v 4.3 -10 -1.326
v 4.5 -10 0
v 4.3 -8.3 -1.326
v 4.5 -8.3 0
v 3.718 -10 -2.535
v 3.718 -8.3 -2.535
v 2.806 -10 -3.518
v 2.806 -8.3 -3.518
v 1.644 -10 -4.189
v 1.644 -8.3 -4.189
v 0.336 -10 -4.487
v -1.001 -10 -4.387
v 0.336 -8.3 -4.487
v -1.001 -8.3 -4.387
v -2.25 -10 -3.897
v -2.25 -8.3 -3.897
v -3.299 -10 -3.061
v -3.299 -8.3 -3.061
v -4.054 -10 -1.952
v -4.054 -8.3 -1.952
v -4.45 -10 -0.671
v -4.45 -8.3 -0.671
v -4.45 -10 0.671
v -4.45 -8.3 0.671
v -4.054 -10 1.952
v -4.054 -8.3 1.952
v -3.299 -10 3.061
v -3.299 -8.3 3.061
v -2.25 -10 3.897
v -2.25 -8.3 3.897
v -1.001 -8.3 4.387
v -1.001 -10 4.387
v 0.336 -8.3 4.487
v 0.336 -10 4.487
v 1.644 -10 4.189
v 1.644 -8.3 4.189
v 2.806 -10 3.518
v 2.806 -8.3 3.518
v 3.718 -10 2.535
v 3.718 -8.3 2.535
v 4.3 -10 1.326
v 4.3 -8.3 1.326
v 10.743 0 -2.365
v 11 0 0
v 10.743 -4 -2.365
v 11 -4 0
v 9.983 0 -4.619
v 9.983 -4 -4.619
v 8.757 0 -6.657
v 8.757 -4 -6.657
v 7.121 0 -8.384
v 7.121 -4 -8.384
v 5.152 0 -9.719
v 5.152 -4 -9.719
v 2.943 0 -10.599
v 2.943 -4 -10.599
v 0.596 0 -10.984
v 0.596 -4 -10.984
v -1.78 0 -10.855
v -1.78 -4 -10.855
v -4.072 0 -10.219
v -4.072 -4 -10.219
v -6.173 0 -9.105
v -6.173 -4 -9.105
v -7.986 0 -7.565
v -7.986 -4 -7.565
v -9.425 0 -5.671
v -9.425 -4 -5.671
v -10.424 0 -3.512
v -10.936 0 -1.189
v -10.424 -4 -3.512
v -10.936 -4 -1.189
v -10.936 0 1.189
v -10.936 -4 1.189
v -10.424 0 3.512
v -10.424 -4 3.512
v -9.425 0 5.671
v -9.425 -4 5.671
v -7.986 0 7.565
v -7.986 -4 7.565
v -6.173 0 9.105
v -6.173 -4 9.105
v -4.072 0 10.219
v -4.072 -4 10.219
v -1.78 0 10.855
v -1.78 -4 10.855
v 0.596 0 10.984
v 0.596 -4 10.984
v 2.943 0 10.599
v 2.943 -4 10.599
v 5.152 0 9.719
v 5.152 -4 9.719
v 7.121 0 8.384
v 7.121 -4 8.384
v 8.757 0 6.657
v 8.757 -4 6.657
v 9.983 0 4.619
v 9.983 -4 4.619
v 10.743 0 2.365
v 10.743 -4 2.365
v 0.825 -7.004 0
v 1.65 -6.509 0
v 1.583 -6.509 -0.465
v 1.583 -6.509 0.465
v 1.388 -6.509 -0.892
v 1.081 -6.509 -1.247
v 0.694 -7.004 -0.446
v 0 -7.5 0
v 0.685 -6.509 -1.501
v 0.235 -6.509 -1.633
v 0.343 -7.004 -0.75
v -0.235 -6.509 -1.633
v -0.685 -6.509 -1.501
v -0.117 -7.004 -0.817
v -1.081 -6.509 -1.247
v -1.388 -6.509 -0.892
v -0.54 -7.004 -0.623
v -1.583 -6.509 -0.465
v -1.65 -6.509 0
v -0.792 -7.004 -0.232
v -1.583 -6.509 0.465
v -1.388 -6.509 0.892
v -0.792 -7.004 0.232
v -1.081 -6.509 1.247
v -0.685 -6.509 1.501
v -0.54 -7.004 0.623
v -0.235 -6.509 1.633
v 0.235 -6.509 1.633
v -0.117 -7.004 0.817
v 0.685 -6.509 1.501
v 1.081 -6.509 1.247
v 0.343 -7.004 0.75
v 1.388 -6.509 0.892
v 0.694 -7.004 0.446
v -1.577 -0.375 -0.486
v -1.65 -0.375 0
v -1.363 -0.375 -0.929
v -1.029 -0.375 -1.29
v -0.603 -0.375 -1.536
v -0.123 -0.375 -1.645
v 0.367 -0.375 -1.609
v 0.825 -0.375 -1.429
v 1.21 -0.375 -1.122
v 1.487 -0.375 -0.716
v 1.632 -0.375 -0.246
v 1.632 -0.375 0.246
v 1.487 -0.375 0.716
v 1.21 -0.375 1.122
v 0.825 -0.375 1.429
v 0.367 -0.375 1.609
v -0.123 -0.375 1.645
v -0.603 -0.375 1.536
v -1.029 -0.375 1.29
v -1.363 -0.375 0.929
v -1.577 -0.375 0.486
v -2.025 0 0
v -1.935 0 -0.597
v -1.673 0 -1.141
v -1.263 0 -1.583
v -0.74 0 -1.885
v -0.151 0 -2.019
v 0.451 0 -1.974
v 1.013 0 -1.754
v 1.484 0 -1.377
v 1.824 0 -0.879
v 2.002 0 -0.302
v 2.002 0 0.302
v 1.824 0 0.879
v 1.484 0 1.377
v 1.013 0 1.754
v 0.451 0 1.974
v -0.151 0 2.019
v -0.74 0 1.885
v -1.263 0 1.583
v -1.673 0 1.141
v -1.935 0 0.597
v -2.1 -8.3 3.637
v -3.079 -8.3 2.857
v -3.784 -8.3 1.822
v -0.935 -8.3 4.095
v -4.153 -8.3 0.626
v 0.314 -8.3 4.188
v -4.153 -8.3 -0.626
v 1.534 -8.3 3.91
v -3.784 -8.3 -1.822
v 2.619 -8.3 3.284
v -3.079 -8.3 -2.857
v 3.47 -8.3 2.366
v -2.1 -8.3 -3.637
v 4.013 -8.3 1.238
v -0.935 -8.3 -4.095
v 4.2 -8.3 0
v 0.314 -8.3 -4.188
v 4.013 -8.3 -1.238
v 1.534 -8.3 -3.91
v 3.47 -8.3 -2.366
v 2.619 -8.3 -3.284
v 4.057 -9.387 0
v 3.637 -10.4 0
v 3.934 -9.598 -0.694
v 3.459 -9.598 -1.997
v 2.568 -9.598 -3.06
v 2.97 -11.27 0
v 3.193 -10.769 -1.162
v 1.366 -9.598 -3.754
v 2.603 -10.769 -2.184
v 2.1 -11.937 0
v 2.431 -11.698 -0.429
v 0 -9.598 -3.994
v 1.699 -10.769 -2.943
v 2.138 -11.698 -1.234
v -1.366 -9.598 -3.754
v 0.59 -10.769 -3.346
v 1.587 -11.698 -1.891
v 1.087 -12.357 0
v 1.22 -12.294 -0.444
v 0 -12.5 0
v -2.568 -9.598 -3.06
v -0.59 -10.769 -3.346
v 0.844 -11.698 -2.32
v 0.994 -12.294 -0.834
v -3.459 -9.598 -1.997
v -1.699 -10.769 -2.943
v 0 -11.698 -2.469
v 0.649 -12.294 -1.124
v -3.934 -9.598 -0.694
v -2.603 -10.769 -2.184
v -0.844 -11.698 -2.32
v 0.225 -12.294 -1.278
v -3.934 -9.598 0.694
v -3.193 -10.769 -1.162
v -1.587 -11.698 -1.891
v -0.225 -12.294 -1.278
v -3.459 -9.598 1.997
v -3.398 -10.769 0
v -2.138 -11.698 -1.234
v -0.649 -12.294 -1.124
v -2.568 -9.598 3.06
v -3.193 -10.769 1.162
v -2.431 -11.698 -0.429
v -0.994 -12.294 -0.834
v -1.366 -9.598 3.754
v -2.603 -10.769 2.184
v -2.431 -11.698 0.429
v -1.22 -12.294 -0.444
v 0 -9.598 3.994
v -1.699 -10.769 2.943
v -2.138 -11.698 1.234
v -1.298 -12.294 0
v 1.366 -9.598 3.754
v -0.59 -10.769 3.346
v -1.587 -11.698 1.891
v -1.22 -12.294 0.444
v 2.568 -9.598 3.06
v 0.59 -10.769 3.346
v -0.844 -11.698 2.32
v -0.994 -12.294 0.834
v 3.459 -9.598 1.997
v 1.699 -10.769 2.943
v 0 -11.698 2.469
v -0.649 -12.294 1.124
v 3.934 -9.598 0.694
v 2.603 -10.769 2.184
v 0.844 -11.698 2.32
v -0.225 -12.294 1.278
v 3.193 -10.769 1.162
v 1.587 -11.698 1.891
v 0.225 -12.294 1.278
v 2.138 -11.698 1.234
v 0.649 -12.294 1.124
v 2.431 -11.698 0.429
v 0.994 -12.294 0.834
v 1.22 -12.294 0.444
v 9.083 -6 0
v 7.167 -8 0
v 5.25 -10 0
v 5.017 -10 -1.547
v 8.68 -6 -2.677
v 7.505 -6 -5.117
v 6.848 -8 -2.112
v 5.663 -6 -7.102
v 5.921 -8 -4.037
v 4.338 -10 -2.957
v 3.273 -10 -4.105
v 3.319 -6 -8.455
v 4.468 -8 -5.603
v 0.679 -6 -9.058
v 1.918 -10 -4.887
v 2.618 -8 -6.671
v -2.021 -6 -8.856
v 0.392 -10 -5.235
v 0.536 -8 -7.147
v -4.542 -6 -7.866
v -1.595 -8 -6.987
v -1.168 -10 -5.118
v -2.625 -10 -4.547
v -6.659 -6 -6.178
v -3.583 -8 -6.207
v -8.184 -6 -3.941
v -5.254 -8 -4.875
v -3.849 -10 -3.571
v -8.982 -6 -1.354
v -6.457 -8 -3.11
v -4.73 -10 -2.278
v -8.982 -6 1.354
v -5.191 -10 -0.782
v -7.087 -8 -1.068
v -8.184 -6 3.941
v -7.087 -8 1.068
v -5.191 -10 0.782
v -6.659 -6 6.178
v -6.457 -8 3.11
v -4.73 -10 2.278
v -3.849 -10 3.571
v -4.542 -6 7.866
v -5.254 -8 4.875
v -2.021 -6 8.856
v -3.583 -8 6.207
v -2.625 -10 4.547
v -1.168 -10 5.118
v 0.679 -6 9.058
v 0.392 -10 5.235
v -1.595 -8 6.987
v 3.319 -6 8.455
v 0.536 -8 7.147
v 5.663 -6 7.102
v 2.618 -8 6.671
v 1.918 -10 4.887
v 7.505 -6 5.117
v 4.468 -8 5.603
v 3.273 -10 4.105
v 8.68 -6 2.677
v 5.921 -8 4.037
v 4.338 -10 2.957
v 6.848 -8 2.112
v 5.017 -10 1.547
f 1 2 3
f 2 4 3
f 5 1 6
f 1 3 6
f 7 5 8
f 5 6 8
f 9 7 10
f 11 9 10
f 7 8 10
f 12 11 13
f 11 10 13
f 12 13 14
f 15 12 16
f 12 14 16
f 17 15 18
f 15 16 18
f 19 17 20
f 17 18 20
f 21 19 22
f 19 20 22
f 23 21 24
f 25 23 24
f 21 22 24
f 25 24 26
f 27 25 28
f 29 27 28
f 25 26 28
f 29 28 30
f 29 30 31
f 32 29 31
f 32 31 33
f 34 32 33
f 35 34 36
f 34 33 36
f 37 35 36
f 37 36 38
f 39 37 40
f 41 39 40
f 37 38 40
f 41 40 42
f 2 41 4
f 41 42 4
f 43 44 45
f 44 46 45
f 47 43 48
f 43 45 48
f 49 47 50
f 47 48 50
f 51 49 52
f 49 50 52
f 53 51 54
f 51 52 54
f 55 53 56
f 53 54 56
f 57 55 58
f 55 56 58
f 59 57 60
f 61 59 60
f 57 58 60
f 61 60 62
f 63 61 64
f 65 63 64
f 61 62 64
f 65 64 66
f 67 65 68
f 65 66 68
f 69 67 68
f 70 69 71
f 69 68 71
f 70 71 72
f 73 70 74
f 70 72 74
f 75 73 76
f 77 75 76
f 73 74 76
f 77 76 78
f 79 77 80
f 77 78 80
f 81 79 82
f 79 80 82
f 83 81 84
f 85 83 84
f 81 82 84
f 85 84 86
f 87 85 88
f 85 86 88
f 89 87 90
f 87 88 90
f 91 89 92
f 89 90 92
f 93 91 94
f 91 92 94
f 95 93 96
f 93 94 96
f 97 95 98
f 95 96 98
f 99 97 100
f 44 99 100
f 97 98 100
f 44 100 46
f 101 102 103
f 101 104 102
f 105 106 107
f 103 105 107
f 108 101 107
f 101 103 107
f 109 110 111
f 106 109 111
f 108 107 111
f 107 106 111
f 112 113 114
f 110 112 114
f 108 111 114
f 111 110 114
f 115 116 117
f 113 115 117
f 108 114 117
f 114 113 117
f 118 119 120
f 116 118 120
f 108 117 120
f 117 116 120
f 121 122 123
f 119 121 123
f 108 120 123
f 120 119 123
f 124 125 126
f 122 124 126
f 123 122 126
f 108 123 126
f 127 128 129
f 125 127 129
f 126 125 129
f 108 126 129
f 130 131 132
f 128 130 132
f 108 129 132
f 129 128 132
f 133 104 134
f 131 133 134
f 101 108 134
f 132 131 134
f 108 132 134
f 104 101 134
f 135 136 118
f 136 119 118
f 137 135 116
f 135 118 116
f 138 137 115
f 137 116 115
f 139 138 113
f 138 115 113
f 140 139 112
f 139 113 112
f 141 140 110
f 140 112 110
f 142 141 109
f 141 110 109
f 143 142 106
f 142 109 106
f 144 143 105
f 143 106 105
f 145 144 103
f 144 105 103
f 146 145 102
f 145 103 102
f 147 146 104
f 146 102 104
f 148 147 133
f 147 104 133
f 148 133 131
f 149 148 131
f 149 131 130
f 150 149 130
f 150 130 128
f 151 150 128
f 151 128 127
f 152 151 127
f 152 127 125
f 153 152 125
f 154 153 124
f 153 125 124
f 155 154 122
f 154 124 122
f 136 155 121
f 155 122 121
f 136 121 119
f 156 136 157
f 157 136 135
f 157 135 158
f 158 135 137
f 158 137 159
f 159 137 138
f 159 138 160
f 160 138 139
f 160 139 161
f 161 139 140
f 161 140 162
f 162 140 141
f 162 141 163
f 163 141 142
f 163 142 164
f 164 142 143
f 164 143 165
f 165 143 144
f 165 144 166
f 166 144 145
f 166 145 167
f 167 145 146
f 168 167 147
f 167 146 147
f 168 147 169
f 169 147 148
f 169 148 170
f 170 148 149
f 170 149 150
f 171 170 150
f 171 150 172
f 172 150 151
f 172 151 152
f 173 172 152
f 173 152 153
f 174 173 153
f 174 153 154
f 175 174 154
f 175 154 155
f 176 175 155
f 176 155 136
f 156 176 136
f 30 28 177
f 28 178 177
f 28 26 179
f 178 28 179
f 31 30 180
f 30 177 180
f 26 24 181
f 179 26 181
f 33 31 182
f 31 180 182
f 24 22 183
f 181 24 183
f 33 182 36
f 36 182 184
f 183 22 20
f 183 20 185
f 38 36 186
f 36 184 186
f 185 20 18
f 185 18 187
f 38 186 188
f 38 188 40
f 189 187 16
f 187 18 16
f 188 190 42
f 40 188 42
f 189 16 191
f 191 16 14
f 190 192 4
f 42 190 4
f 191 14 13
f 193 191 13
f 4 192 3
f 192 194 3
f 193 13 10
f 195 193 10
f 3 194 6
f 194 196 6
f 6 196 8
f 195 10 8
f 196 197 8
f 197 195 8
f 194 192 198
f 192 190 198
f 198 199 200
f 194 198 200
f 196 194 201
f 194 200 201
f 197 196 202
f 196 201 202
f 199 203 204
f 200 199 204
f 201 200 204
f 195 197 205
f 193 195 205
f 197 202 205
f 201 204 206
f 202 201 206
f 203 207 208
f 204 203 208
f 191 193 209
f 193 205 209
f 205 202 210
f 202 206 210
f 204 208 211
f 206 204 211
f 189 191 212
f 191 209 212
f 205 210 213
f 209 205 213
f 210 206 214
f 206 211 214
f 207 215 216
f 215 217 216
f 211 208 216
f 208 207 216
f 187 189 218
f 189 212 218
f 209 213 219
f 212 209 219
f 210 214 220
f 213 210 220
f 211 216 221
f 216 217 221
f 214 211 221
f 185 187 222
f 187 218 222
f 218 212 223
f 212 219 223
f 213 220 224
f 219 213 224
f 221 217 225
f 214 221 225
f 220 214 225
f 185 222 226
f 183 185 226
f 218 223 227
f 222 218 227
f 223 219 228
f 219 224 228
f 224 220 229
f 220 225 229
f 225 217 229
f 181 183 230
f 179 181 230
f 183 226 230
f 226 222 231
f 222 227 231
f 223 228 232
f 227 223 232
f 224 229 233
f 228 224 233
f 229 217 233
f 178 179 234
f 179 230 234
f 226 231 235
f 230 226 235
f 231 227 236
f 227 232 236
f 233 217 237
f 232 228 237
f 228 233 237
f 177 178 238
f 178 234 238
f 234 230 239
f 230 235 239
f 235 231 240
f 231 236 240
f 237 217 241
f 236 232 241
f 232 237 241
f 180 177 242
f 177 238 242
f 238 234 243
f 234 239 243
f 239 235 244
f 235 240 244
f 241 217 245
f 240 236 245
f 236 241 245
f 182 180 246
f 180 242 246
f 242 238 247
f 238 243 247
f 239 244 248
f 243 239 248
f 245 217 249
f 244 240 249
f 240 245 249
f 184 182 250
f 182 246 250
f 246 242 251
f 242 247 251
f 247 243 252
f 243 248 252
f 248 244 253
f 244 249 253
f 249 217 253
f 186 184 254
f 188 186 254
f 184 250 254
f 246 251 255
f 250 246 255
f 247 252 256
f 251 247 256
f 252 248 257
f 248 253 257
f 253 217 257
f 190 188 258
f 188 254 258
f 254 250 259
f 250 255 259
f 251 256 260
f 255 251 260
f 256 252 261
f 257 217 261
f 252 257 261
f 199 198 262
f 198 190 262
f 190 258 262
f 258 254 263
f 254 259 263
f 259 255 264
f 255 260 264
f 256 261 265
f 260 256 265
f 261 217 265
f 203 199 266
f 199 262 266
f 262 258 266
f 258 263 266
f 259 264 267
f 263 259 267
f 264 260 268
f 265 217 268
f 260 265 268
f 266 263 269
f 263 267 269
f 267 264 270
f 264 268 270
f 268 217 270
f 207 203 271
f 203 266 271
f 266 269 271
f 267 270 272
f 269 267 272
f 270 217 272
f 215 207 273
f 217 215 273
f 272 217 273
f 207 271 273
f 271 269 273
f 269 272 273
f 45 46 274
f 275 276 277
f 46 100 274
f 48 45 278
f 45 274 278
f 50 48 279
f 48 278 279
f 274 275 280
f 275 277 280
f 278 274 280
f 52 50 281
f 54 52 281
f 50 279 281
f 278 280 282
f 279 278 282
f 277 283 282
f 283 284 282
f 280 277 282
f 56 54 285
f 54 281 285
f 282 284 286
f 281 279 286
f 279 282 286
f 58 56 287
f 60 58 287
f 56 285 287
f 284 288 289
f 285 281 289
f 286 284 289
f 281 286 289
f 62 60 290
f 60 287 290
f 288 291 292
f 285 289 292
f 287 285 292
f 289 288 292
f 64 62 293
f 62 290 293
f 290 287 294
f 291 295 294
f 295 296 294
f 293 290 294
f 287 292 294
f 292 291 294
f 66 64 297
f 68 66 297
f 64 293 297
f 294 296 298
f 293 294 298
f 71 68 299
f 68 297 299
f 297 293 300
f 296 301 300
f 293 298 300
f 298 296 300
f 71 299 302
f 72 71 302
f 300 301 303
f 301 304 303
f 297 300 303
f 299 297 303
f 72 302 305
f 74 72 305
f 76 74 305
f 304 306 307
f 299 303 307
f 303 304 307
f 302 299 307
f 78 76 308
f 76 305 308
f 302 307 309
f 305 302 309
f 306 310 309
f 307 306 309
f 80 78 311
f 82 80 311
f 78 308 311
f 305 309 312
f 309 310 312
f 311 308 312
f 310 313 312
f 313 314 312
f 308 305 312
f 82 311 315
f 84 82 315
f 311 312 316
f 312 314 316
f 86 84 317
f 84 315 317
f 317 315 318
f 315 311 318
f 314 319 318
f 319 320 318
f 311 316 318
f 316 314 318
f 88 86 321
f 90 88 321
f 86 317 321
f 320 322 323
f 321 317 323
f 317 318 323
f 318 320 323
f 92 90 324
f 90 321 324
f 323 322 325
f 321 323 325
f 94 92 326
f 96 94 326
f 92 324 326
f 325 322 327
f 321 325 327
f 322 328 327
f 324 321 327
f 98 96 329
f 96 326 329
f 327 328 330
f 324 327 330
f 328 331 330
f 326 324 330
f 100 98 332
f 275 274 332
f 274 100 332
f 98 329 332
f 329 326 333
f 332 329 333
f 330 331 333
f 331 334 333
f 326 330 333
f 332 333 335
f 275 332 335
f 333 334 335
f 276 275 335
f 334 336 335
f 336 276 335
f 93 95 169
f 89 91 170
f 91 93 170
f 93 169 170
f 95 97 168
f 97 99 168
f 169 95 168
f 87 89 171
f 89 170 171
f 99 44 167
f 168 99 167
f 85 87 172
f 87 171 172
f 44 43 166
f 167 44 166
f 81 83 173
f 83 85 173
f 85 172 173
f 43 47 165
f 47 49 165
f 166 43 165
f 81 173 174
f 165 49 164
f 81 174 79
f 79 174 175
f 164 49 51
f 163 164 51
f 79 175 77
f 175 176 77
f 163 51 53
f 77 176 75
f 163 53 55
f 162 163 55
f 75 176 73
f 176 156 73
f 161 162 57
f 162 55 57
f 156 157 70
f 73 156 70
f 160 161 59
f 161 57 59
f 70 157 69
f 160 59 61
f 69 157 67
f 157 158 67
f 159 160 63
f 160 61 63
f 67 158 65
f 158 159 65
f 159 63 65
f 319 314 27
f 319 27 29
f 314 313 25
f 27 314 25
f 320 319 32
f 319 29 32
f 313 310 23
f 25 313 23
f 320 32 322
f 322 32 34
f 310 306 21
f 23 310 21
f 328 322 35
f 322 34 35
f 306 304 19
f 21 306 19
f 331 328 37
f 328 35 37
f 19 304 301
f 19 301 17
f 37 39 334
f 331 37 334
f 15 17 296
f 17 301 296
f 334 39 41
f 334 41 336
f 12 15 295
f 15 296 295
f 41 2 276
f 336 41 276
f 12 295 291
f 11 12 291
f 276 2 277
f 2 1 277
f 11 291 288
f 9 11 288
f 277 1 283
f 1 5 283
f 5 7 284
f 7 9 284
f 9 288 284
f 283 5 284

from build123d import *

# Parameters (mm, degrees)
M4X0_7_TAPPED_HOLE1_D           = 3.3
M4X0_7_TAPPED_HOLE1_DEPTH       = 6.508579979
M4X0_7_TAPPED_HOLE1_CSINK_D     = 4.05
M4X0_7_TAPPED_HOLE1_CSINK_ANGLE = 90
M4X0_7_TAPPED_HOLE1_TIP         = 0.991420021


with BuildPart() as part:
    # Sketch1 → Revolve1 (revolve)
    with BuildSketch(Plane.XY, mode=Mode.PRIVATE) as revolve1_sk:
        with BuildLine():
            Line((0, 0), (-11, 0))
            Line((-11, 0), (-11, -4))
            Line((-11, -4), (-5.25, -10))
            Line((-5.25, -10), (-4.5, -10))
            Line((-4.5, -10), (-4.5, -8.3))
            Line((-4.5, -8.3), (-4.2, -8.3))
            ThreePointArc((-4.2, -8.3), (-2.969848481, -11.269848481), (0, -12.5))
            Line((0, -12.5), (0, 0))
        make_face()
    revolve(revolve1_sk.sketch.rotate(Axis((0, -12.5, 0), (0, 1, 0)), 180), axis=Axis((0, -12.5, 0), (0, 1, 0)))

    # M4x0.7 Tapped Hole1
    with Locations(Plane(origin=(0, 0, 0), x_dir=(1, 0, 0), z_dir=(0, 1, 0))):
        with Locations((0, 0)):
            CounterSinkHole(M4X0_7_TAPPED_HOLE1_D / 2, M4X0_7_TAPPED_HOLE1_CSINK_D / 2, depth=M4X0_7_TAPPED_HOLE1_DEPTH, counter_sink_angle=M4X0_7_TAPPED_HOLE1_CSINK_ANGLE)
            with Locations((0, 0, -(M4X0_7_TAPPED_HOLE1_DEPTH + M4X0_7_TAPPED_HOLE1_TIP / 2))):  # 118° drill point
                Cone(0, M4X0_7_TAPPED_HOLE1_D / 2, M4X0_7_TAPPED_HOLE1_TIP, mode=Mode.SUBTRACT)


solid = part.part
